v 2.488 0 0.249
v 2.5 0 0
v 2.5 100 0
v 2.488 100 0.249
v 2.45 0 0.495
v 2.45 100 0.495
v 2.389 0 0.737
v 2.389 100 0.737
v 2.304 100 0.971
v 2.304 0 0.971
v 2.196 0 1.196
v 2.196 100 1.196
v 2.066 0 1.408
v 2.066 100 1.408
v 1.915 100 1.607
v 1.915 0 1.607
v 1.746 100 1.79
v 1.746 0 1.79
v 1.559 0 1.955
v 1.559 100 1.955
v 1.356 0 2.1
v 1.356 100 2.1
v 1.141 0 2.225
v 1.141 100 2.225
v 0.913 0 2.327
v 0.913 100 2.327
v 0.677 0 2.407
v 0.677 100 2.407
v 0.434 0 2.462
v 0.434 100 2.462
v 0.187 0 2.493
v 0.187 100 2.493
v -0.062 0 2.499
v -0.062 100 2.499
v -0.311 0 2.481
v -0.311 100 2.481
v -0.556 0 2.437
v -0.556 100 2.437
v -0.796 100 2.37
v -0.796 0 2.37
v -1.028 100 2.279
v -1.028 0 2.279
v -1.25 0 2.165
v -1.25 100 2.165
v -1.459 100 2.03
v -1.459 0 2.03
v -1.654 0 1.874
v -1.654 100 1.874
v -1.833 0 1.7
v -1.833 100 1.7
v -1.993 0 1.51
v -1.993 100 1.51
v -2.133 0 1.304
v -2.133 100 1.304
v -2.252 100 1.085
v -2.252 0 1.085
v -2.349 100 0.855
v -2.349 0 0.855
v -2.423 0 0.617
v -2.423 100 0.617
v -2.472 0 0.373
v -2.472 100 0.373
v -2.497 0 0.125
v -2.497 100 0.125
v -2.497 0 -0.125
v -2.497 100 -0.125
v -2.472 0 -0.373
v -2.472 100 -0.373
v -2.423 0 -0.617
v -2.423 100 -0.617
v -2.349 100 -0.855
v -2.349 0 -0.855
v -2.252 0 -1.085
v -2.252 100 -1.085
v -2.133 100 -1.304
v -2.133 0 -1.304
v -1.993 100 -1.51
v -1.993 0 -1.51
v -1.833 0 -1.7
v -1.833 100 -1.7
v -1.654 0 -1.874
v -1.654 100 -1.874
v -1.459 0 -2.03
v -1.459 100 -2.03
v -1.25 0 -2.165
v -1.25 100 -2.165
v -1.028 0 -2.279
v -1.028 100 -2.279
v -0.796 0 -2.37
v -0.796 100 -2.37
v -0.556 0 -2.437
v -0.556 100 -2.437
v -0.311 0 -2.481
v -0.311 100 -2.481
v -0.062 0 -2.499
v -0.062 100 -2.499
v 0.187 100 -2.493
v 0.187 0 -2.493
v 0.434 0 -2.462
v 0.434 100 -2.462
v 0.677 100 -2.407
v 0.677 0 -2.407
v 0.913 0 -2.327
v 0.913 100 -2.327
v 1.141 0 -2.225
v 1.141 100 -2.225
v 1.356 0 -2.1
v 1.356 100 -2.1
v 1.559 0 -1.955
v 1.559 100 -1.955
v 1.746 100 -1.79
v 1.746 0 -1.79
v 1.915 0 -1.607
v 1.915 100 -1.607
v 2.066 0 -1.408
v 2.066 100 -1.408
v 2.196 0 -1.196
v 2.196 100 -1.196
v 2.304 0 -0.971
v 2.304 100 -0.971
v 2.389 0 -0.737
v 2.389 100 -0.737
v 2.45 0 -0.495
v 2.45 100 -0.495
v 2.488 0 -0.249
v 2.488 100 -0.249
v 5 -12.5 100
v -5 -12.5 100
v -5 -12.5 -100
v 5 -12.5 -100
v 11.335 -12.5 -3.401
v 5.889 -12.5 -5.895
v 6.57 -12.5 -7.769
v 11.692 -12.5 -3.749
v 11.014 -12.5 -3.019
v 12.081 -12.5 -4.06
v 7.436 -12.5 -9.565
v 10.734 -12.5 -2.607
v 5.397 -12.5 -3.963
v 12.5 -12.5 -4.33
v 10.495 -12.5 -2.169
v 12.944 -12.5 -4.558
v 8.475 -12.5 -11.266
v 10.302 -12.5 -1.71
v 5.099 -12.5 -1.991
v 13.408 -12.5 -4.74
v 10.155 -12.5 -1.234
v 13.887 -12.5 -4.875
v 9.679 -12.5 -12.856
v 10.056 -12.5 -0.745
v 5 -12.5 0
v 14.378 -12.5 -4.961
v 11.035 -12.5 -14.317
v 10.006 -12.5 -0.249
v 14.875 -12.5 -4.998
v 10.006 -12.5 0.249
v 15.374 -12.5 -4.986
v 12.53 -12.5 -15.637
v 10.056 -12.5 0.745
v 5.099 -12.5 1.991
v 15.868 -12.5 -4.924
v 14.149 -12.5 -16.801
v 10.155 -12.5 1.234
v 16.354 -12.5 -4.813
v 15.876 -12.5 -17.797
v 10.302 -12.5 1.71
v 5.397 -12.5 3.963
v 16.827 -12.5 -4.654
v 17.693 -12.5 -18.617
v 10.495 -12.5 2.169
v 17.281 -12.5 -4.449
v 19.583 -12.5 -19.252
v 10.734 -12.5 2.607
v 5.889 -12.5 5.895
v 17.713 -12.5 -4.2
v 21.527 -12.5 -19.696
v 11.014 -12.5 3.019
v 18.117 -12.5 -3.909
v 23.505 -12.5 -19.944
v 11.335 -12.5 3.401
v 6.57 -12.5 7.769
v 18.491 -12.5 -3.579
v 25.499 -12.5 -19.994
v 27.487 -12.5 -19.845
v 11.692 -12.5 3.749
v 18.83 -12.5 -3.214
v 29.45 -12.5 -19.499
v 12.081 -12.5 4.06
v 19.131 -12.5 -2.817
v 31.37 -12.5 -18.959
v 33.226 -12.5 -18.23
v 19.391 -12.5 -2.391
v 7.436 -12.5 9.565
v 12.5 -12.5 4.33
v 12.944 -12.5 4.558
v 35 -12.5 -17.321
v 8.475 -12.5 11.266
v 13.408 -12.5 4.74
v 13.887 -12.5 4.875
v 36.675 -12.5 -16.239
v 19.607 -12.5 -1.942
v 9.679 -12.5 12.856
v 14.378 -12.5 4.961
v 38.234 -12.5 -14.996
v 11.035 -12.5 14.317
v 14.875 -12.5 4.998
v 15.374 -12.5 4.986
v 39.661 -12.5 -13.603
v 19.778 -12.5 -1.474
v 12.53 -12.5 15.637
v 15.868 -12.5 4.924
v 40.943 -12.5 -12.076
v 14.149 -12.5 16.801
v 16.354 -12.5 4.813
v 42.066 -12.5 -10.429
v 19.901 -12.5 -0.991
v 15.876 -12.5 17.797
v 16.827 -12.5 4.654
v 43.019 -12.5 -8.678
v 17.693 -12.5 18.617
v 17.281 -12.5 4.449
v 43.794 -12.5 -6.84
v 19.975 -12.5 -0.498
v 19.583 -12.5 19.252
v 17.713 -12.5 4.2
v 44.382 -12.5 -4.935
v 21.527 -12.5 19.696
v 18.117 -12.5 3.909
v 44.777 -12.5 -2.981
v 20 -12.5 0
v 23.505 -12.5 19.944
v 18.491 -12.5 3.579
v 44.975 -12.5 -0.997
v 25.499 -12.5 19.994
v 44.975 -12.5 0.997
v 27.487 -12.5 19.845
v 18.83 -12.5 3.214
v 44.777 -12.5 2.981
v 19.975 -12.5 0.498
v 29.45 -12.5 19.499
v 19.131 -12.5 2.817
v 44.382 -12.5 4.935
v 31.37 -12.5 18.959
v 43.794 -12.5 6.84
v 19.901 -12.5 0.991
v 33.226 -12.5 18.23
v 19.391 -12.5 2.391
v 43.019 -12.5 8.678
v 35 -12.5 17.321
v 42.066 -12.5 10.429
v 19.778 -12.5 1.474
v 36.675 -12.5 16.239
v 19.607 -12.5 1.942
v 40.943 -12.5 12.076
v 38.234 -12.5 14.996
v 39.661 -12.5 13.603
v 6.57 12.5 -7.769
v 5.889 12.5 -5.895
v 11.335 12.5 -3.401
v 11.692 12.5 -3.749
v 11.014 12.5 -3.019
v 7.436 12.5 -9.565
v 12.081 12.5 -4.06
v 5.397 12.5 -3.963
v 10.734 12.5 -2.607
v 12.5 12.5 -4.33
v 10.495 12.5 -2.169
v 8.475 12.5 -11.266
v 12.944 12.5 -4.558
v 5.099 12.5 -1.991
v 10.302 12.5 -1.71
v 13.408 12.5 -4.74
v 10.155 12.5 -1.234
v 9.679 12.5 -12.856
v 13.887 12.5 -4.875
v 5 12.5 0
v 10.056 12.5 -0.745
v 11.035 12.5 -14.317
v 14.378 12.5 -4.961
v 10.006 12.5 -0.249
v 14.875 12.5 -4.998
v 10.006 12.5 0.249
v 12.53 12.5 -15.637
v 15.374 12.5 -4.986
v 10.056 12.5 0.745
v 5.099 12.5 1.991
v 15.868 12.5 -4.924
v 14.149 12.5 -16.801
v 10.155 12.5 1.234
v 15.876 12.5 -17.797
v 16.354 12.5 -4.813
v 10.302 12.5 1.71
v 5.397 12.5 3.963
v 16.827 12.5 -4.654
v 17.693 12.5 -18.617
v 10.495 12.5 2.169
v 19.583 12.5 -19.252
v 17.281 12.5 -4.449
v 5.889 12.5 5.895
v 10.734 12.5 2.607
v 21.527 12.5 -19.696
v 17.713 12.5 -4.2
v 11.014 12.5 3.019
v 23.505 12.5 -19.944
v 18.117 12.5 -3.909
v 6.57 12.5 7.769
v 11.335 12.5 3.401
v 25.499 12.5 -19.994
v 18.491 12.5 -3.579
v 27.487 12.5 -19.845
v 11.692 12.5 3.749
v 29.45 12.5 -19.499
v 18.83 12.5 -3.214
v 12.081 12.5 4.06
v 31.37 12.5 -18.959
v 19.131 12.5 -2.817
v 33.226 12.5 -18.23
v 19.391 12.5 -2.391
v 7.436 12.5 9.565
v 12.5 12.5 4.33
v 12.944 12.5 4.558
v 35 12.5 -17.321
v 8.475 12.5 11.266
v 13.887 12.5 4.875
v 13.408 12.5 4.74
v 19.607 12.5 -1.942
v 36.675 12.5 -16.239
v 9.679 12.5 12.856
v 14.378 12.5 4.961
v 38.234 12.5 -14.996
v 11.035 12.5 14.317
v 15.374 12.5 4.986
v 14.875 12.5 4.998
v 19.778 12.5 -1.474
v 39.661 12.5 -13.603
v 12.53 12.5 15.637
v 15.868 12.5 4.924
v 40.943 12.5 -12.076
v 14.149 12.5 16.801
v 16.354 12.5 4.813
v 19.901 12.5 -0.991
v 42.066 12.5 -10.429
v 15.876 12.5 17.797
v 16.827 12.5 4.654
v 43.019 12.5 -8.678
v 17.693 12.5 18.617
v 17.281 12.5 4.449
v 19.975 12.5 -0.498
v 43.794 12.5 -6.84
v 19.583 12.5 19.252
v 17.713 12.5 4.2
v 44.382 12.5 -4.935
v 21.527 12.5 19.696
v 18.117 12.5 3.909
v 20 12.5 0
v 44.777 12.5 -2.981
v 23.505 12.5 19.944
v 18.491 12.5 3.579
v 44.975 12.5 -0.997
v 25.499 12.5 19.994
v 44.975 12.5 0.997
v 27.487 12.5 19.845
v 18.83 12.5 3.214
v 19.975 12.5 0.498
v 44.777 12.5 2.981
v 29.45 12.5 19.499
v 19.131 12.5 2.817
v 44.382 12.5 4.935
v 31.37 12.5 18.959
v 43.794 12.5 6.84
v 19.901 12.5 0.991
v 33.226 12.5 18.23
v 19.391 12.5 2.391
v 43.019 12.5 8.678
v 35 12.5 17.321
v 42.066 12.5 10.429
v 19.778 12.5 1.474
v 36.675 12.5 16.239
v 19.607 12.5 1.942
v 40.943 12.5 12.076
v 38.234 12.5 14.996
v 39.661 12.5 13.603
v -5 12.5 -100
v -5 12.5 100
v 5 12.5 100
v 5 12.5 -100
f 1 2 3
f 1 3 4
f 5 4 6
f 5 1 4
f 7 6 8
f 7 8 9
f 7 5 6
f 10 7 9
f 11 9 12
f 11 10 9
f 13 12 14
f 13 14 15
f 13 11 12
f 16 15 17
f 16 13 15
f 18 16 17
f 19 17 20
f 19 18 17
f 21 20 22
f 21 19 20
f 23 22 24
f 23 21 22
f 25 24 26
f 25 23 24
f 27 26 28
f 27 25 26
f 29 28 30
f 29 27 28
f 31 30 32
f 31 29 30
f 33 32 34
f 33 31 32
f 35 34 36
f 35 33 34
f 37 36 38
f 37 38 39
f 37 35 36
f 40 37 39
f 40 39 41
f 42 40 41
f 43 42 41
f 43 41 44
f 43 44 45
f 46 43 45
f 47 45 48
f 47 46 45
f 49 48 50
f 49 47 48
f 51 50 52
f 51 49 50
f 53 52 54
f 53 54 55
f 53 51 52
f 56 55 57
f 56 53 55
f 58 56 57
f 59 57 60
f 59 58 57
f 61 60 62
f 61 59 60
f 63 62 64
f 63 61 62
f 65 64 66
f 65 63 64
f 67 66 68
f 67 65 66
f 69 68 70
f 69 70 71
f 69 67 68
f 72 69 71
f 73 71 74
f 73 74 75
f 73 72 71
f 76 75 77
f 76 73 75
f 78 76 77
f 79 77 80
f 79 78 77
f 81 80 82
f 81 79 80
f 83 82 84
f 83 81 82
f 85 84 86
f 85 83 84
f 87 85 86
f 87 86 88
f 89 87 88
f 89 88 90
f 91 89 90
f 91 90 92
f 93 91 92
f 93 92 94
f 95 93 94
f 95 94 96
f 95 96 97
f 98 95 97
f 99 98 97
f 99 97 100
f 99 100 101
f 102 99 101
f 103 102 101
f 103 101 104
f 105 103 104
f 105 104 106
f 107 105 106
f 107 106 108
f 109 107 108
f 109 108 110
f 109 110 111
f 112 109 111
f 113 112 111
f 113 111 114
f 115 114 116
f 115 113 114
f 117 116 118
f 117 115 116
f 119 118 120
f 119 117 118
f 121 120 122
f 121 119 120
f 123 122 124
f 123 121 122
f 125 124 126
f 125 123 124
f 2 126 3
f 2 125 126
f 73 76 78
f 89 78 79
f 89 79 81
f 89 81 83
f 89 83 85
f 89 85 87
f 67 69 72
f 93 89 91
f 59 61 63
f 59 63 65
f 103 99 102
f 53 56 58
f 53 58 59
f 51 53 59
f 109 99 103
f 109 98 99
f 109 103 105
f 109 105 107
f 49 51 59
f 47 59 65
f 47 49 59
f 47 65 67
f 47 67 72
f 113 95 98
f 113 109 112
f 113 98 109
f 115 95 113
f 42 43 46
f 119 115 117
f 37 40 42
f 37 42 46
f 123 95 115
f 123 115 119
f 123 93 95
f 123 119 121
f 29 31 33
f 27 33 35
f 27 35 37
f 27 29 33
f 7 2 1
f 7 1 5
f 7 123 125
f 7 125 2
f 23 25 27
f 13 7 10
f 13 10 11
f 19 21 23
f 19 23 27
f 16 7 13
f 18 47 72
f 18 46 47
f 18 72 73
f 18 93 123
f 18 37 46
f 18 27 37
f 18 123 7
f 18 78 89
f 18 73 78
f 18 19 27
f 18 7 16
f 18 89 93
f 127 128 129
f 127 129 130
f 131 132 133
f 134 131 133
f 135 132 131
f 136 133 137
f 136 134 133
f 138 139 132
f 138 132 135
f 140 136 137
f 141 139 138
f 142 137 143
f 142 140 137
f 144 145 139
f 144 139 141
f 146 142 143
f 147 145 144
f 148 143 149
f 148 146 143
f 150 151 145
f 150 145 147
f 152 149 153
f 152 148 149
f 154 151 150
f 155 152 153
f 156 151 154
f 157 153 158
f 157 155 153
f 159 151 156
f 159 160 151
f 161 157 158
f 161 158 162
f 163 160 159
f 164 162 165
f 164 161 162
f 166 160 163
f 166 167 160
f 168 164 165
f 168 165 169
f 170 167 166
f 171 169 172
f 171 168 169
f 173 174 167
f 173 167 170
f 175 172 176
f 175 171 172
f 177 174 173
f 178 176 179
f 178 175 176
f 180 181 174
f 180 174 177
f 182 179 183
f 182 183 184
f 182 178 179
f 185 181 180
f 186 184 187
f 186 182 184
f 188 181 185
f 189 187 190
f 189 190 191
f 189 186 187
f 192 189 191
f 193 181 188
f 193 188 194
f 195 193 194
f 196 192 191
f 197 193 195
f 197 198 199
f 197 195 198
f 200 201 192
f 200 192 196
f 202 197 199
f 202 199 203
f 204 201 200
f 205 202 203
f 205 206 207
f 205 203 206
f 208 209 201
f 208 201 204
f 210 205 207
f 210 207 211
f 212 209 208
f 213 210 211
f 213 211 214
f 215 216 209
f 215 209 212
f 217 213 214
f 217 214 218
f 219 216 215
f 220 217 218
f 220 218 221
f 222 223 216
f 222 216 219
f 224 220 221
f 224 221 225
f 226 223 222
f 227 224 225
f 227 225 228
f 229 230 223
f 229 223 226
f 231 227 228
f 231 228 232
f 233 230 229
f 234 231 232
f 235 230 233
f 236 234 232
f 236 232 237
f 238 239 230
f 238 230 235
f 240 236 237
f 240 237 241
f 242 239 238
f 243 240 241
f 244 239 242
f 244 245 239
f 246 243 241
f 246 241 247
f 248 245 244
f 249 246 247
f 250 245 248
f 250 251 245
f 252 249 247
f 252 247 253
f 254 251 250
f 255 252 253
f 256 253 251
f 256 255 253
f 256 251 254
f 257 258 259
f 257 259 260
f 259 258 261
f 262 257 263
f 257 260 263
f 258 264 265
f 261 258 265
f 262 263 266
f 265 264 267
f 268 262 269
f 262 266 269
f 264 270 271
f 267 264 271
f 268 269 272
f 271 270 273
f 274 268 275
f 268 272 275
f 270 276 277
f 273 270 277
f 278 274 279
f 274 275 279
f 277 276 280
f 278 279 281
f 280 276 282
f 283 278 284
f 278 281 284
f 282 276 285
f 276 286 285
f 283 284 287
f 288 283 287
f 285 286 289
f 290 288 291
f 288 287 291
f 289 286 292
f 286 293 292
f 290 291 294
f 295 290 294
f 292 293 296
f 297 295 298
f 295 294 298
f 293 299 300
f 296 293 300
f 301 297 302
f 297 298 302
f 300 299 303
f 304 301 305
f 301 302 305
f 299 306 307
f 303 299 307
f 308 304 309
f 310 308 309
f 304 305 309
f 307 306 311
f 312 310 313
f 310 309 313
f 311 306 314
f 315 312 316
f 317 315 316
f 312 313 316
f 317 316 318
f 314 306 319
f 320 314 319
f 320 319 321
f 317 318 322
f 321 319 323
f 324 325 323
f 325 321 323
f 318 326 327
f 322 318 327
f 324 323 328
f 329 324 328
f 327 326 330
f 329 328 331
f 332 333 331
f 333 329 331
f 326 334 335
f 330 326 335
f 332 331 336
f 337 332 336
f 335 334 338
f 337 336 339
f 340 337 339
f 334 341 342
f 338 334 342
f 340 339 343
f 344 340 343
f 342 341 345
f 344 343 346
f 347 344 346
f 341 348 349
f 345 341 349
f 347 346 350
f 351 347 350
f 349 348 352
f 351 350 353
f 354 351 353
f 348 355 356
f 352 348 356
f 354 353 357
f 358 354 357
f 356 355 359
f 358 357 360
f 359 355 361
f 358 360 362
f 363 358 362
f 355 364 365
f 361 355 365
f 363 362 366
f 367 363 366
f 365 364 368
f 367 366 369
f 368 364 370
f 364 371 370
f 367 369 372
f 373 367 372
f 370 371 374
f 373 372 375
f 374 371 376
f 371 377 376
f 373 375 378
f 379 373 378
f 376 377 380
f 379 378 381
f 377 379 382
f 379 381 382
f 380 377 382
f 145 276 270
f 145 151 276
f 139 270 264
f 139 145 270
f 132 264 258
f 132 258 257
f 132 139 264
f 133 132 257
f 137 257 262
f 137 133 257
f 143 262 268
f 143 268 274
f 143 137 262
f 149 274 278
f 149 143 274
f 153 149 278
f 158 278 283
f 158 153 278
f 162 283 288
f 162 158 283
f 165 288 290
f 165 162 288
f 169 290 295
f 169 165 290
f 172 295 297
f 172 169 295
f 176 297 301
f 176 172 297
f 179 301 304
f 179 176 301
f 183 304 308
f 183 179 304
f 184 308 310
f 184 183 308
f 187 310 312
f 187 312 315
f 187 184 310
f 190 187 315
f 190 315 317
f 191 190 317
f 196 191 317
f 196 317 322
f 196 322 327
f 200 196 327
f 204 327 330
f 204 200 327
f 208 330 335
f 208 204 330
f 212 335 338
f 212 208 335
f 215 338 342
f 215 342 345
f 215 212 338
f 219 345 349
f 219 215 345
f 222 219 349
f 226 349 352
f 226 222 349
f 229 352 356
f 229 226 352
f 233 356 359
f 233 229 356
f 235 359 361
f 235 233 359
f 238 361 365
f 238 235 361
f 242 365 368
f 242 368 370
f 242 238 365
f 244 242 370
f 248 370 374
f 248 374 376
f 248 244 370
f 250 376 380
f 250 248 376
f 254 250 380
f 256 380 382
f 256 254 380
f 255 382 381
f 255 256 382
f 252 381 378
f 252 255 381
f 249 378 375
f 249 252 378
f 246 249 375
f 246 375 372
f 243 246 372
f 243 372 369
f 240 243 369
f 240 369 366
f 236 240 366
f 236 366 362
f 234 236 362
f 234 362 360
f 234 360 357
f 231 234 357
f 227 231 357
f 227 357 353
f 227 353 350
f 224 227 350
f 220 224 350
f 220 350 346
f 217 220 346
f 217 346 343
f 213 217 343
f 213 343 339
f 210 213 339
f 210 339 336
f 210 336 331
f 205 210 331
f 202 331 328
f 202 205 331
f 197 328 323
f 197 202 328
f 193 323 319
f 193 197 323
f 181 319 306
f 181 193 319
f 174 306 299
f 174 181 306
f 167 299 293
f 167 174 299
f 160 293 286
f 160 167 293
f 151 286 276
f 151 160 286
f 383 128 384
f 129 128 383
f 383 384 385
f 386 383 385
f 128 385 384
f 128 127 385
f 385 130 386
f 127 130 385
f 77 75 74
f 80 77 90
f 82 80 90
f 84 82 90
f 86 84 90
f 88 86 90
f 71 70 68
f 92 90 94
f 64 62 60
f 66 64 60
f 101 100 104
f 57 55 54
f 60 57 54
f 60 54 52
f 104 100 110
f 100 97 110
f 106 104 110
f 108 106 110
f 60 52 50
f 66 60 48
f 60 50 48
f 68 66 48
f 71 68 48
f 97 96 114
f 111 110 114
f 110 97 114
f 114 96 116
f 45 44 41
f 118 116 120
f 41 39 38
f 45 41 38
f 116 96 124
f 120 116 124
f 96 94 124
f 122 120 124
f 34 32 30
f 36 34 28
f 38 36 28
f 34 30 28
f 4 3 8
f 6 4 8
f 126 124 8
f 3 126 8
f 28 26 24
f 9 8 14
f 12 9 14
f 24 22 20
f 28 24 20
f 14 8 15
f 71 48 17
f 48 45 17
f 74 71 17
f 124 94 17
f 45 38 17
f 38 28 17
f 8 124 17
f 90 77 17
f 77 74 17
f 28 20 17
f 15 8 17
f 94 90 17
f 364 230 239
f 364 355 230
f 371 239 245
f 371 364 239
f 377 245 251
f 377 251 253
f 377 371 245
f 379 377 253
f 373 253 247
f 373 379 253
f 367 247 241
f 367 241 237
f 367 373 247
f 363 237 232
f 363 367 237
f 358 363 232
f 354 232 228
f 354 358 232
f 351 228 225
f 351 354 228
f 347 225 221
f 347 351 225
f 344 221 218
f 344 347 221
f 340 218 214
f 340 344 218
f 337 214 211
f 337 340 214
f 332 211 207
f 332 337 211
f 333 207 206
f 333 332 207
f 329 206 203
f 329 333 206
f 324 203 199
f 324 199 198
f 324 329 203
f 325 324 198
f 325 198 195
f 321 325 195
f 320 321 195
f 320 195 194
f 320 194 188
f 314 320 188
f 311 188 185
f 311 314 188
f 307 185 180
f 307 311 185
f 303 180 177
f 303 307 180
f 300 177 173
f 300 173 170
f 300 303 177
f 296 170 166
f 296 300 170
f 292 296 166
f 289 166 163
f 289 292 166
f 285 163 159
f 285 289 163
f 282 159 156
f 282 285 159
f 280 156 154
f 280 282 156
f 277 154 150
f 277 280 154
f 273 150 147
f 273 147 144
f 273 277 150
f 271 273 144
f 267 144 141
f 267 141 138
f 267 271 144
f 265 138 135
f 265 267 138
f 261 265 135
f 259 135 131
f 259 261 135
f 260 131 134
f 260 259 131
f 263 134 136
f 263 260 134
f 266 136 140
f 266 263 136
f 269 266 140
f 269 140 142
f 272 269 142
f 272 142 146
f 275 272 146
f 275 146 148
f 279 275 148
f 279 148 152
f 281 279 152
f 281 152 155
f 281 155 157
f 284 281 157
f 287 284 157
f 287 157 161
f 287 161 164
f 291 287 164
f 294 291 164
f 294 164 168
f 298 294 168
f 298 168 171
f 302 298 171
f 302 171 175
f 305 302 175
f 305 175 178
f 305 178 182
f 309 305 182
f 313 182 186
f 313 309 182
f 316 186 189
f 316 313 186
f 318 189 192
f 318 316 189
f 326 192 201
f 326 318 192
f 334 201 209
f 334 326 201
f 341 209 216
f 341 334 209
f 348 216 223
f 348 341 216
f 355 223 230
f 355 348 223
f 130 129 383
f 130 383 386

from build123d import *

# Parameters (mm, degrees)
F1_DEPTH = 12.5
F0_R     = 5
F2_R     = 2.5
F3_DEPTH = 100


with BuildPart() as f1:
    # F0 (on Front) → F1 (new body, symmetric)
    with BuildSketch(Plane.XZ):
        Polygon((5, 100), (-5, 100), (-5, -100), (5, -100), (5, 1.94e-08), align=None)
    extrude(amount=F1_DEPTH, both=True)


with BuildPart() as f1b:
    # F0 (on Front) → F1, piece 2 (new body, symmetric)
    with BuildSketch(Plane.XZ):
        with BuildLine():
            ThreePointArc((45, 0), (25.0000000097, 20), (5, 1.94e-08))
            ThreePointArc((5, 1.94e-08), (24.9999999903, -20), (45, 0))
        make_face()
        with Locations((15, 0)):
            Circle(F0_R, mode=Mode.SUBTRACT)
    extrude(amount=F1_DEPTH, both=True)


with BuildPart() as f3:
    # F2 (on Front) → F3 (new body)
    with BuildSketch(Plane.XZ):
        Circle(F2_R)
    extrude(amount=-F3_DEPTH)


solid = Compound([f1.part, f1b.part, f3.part])
